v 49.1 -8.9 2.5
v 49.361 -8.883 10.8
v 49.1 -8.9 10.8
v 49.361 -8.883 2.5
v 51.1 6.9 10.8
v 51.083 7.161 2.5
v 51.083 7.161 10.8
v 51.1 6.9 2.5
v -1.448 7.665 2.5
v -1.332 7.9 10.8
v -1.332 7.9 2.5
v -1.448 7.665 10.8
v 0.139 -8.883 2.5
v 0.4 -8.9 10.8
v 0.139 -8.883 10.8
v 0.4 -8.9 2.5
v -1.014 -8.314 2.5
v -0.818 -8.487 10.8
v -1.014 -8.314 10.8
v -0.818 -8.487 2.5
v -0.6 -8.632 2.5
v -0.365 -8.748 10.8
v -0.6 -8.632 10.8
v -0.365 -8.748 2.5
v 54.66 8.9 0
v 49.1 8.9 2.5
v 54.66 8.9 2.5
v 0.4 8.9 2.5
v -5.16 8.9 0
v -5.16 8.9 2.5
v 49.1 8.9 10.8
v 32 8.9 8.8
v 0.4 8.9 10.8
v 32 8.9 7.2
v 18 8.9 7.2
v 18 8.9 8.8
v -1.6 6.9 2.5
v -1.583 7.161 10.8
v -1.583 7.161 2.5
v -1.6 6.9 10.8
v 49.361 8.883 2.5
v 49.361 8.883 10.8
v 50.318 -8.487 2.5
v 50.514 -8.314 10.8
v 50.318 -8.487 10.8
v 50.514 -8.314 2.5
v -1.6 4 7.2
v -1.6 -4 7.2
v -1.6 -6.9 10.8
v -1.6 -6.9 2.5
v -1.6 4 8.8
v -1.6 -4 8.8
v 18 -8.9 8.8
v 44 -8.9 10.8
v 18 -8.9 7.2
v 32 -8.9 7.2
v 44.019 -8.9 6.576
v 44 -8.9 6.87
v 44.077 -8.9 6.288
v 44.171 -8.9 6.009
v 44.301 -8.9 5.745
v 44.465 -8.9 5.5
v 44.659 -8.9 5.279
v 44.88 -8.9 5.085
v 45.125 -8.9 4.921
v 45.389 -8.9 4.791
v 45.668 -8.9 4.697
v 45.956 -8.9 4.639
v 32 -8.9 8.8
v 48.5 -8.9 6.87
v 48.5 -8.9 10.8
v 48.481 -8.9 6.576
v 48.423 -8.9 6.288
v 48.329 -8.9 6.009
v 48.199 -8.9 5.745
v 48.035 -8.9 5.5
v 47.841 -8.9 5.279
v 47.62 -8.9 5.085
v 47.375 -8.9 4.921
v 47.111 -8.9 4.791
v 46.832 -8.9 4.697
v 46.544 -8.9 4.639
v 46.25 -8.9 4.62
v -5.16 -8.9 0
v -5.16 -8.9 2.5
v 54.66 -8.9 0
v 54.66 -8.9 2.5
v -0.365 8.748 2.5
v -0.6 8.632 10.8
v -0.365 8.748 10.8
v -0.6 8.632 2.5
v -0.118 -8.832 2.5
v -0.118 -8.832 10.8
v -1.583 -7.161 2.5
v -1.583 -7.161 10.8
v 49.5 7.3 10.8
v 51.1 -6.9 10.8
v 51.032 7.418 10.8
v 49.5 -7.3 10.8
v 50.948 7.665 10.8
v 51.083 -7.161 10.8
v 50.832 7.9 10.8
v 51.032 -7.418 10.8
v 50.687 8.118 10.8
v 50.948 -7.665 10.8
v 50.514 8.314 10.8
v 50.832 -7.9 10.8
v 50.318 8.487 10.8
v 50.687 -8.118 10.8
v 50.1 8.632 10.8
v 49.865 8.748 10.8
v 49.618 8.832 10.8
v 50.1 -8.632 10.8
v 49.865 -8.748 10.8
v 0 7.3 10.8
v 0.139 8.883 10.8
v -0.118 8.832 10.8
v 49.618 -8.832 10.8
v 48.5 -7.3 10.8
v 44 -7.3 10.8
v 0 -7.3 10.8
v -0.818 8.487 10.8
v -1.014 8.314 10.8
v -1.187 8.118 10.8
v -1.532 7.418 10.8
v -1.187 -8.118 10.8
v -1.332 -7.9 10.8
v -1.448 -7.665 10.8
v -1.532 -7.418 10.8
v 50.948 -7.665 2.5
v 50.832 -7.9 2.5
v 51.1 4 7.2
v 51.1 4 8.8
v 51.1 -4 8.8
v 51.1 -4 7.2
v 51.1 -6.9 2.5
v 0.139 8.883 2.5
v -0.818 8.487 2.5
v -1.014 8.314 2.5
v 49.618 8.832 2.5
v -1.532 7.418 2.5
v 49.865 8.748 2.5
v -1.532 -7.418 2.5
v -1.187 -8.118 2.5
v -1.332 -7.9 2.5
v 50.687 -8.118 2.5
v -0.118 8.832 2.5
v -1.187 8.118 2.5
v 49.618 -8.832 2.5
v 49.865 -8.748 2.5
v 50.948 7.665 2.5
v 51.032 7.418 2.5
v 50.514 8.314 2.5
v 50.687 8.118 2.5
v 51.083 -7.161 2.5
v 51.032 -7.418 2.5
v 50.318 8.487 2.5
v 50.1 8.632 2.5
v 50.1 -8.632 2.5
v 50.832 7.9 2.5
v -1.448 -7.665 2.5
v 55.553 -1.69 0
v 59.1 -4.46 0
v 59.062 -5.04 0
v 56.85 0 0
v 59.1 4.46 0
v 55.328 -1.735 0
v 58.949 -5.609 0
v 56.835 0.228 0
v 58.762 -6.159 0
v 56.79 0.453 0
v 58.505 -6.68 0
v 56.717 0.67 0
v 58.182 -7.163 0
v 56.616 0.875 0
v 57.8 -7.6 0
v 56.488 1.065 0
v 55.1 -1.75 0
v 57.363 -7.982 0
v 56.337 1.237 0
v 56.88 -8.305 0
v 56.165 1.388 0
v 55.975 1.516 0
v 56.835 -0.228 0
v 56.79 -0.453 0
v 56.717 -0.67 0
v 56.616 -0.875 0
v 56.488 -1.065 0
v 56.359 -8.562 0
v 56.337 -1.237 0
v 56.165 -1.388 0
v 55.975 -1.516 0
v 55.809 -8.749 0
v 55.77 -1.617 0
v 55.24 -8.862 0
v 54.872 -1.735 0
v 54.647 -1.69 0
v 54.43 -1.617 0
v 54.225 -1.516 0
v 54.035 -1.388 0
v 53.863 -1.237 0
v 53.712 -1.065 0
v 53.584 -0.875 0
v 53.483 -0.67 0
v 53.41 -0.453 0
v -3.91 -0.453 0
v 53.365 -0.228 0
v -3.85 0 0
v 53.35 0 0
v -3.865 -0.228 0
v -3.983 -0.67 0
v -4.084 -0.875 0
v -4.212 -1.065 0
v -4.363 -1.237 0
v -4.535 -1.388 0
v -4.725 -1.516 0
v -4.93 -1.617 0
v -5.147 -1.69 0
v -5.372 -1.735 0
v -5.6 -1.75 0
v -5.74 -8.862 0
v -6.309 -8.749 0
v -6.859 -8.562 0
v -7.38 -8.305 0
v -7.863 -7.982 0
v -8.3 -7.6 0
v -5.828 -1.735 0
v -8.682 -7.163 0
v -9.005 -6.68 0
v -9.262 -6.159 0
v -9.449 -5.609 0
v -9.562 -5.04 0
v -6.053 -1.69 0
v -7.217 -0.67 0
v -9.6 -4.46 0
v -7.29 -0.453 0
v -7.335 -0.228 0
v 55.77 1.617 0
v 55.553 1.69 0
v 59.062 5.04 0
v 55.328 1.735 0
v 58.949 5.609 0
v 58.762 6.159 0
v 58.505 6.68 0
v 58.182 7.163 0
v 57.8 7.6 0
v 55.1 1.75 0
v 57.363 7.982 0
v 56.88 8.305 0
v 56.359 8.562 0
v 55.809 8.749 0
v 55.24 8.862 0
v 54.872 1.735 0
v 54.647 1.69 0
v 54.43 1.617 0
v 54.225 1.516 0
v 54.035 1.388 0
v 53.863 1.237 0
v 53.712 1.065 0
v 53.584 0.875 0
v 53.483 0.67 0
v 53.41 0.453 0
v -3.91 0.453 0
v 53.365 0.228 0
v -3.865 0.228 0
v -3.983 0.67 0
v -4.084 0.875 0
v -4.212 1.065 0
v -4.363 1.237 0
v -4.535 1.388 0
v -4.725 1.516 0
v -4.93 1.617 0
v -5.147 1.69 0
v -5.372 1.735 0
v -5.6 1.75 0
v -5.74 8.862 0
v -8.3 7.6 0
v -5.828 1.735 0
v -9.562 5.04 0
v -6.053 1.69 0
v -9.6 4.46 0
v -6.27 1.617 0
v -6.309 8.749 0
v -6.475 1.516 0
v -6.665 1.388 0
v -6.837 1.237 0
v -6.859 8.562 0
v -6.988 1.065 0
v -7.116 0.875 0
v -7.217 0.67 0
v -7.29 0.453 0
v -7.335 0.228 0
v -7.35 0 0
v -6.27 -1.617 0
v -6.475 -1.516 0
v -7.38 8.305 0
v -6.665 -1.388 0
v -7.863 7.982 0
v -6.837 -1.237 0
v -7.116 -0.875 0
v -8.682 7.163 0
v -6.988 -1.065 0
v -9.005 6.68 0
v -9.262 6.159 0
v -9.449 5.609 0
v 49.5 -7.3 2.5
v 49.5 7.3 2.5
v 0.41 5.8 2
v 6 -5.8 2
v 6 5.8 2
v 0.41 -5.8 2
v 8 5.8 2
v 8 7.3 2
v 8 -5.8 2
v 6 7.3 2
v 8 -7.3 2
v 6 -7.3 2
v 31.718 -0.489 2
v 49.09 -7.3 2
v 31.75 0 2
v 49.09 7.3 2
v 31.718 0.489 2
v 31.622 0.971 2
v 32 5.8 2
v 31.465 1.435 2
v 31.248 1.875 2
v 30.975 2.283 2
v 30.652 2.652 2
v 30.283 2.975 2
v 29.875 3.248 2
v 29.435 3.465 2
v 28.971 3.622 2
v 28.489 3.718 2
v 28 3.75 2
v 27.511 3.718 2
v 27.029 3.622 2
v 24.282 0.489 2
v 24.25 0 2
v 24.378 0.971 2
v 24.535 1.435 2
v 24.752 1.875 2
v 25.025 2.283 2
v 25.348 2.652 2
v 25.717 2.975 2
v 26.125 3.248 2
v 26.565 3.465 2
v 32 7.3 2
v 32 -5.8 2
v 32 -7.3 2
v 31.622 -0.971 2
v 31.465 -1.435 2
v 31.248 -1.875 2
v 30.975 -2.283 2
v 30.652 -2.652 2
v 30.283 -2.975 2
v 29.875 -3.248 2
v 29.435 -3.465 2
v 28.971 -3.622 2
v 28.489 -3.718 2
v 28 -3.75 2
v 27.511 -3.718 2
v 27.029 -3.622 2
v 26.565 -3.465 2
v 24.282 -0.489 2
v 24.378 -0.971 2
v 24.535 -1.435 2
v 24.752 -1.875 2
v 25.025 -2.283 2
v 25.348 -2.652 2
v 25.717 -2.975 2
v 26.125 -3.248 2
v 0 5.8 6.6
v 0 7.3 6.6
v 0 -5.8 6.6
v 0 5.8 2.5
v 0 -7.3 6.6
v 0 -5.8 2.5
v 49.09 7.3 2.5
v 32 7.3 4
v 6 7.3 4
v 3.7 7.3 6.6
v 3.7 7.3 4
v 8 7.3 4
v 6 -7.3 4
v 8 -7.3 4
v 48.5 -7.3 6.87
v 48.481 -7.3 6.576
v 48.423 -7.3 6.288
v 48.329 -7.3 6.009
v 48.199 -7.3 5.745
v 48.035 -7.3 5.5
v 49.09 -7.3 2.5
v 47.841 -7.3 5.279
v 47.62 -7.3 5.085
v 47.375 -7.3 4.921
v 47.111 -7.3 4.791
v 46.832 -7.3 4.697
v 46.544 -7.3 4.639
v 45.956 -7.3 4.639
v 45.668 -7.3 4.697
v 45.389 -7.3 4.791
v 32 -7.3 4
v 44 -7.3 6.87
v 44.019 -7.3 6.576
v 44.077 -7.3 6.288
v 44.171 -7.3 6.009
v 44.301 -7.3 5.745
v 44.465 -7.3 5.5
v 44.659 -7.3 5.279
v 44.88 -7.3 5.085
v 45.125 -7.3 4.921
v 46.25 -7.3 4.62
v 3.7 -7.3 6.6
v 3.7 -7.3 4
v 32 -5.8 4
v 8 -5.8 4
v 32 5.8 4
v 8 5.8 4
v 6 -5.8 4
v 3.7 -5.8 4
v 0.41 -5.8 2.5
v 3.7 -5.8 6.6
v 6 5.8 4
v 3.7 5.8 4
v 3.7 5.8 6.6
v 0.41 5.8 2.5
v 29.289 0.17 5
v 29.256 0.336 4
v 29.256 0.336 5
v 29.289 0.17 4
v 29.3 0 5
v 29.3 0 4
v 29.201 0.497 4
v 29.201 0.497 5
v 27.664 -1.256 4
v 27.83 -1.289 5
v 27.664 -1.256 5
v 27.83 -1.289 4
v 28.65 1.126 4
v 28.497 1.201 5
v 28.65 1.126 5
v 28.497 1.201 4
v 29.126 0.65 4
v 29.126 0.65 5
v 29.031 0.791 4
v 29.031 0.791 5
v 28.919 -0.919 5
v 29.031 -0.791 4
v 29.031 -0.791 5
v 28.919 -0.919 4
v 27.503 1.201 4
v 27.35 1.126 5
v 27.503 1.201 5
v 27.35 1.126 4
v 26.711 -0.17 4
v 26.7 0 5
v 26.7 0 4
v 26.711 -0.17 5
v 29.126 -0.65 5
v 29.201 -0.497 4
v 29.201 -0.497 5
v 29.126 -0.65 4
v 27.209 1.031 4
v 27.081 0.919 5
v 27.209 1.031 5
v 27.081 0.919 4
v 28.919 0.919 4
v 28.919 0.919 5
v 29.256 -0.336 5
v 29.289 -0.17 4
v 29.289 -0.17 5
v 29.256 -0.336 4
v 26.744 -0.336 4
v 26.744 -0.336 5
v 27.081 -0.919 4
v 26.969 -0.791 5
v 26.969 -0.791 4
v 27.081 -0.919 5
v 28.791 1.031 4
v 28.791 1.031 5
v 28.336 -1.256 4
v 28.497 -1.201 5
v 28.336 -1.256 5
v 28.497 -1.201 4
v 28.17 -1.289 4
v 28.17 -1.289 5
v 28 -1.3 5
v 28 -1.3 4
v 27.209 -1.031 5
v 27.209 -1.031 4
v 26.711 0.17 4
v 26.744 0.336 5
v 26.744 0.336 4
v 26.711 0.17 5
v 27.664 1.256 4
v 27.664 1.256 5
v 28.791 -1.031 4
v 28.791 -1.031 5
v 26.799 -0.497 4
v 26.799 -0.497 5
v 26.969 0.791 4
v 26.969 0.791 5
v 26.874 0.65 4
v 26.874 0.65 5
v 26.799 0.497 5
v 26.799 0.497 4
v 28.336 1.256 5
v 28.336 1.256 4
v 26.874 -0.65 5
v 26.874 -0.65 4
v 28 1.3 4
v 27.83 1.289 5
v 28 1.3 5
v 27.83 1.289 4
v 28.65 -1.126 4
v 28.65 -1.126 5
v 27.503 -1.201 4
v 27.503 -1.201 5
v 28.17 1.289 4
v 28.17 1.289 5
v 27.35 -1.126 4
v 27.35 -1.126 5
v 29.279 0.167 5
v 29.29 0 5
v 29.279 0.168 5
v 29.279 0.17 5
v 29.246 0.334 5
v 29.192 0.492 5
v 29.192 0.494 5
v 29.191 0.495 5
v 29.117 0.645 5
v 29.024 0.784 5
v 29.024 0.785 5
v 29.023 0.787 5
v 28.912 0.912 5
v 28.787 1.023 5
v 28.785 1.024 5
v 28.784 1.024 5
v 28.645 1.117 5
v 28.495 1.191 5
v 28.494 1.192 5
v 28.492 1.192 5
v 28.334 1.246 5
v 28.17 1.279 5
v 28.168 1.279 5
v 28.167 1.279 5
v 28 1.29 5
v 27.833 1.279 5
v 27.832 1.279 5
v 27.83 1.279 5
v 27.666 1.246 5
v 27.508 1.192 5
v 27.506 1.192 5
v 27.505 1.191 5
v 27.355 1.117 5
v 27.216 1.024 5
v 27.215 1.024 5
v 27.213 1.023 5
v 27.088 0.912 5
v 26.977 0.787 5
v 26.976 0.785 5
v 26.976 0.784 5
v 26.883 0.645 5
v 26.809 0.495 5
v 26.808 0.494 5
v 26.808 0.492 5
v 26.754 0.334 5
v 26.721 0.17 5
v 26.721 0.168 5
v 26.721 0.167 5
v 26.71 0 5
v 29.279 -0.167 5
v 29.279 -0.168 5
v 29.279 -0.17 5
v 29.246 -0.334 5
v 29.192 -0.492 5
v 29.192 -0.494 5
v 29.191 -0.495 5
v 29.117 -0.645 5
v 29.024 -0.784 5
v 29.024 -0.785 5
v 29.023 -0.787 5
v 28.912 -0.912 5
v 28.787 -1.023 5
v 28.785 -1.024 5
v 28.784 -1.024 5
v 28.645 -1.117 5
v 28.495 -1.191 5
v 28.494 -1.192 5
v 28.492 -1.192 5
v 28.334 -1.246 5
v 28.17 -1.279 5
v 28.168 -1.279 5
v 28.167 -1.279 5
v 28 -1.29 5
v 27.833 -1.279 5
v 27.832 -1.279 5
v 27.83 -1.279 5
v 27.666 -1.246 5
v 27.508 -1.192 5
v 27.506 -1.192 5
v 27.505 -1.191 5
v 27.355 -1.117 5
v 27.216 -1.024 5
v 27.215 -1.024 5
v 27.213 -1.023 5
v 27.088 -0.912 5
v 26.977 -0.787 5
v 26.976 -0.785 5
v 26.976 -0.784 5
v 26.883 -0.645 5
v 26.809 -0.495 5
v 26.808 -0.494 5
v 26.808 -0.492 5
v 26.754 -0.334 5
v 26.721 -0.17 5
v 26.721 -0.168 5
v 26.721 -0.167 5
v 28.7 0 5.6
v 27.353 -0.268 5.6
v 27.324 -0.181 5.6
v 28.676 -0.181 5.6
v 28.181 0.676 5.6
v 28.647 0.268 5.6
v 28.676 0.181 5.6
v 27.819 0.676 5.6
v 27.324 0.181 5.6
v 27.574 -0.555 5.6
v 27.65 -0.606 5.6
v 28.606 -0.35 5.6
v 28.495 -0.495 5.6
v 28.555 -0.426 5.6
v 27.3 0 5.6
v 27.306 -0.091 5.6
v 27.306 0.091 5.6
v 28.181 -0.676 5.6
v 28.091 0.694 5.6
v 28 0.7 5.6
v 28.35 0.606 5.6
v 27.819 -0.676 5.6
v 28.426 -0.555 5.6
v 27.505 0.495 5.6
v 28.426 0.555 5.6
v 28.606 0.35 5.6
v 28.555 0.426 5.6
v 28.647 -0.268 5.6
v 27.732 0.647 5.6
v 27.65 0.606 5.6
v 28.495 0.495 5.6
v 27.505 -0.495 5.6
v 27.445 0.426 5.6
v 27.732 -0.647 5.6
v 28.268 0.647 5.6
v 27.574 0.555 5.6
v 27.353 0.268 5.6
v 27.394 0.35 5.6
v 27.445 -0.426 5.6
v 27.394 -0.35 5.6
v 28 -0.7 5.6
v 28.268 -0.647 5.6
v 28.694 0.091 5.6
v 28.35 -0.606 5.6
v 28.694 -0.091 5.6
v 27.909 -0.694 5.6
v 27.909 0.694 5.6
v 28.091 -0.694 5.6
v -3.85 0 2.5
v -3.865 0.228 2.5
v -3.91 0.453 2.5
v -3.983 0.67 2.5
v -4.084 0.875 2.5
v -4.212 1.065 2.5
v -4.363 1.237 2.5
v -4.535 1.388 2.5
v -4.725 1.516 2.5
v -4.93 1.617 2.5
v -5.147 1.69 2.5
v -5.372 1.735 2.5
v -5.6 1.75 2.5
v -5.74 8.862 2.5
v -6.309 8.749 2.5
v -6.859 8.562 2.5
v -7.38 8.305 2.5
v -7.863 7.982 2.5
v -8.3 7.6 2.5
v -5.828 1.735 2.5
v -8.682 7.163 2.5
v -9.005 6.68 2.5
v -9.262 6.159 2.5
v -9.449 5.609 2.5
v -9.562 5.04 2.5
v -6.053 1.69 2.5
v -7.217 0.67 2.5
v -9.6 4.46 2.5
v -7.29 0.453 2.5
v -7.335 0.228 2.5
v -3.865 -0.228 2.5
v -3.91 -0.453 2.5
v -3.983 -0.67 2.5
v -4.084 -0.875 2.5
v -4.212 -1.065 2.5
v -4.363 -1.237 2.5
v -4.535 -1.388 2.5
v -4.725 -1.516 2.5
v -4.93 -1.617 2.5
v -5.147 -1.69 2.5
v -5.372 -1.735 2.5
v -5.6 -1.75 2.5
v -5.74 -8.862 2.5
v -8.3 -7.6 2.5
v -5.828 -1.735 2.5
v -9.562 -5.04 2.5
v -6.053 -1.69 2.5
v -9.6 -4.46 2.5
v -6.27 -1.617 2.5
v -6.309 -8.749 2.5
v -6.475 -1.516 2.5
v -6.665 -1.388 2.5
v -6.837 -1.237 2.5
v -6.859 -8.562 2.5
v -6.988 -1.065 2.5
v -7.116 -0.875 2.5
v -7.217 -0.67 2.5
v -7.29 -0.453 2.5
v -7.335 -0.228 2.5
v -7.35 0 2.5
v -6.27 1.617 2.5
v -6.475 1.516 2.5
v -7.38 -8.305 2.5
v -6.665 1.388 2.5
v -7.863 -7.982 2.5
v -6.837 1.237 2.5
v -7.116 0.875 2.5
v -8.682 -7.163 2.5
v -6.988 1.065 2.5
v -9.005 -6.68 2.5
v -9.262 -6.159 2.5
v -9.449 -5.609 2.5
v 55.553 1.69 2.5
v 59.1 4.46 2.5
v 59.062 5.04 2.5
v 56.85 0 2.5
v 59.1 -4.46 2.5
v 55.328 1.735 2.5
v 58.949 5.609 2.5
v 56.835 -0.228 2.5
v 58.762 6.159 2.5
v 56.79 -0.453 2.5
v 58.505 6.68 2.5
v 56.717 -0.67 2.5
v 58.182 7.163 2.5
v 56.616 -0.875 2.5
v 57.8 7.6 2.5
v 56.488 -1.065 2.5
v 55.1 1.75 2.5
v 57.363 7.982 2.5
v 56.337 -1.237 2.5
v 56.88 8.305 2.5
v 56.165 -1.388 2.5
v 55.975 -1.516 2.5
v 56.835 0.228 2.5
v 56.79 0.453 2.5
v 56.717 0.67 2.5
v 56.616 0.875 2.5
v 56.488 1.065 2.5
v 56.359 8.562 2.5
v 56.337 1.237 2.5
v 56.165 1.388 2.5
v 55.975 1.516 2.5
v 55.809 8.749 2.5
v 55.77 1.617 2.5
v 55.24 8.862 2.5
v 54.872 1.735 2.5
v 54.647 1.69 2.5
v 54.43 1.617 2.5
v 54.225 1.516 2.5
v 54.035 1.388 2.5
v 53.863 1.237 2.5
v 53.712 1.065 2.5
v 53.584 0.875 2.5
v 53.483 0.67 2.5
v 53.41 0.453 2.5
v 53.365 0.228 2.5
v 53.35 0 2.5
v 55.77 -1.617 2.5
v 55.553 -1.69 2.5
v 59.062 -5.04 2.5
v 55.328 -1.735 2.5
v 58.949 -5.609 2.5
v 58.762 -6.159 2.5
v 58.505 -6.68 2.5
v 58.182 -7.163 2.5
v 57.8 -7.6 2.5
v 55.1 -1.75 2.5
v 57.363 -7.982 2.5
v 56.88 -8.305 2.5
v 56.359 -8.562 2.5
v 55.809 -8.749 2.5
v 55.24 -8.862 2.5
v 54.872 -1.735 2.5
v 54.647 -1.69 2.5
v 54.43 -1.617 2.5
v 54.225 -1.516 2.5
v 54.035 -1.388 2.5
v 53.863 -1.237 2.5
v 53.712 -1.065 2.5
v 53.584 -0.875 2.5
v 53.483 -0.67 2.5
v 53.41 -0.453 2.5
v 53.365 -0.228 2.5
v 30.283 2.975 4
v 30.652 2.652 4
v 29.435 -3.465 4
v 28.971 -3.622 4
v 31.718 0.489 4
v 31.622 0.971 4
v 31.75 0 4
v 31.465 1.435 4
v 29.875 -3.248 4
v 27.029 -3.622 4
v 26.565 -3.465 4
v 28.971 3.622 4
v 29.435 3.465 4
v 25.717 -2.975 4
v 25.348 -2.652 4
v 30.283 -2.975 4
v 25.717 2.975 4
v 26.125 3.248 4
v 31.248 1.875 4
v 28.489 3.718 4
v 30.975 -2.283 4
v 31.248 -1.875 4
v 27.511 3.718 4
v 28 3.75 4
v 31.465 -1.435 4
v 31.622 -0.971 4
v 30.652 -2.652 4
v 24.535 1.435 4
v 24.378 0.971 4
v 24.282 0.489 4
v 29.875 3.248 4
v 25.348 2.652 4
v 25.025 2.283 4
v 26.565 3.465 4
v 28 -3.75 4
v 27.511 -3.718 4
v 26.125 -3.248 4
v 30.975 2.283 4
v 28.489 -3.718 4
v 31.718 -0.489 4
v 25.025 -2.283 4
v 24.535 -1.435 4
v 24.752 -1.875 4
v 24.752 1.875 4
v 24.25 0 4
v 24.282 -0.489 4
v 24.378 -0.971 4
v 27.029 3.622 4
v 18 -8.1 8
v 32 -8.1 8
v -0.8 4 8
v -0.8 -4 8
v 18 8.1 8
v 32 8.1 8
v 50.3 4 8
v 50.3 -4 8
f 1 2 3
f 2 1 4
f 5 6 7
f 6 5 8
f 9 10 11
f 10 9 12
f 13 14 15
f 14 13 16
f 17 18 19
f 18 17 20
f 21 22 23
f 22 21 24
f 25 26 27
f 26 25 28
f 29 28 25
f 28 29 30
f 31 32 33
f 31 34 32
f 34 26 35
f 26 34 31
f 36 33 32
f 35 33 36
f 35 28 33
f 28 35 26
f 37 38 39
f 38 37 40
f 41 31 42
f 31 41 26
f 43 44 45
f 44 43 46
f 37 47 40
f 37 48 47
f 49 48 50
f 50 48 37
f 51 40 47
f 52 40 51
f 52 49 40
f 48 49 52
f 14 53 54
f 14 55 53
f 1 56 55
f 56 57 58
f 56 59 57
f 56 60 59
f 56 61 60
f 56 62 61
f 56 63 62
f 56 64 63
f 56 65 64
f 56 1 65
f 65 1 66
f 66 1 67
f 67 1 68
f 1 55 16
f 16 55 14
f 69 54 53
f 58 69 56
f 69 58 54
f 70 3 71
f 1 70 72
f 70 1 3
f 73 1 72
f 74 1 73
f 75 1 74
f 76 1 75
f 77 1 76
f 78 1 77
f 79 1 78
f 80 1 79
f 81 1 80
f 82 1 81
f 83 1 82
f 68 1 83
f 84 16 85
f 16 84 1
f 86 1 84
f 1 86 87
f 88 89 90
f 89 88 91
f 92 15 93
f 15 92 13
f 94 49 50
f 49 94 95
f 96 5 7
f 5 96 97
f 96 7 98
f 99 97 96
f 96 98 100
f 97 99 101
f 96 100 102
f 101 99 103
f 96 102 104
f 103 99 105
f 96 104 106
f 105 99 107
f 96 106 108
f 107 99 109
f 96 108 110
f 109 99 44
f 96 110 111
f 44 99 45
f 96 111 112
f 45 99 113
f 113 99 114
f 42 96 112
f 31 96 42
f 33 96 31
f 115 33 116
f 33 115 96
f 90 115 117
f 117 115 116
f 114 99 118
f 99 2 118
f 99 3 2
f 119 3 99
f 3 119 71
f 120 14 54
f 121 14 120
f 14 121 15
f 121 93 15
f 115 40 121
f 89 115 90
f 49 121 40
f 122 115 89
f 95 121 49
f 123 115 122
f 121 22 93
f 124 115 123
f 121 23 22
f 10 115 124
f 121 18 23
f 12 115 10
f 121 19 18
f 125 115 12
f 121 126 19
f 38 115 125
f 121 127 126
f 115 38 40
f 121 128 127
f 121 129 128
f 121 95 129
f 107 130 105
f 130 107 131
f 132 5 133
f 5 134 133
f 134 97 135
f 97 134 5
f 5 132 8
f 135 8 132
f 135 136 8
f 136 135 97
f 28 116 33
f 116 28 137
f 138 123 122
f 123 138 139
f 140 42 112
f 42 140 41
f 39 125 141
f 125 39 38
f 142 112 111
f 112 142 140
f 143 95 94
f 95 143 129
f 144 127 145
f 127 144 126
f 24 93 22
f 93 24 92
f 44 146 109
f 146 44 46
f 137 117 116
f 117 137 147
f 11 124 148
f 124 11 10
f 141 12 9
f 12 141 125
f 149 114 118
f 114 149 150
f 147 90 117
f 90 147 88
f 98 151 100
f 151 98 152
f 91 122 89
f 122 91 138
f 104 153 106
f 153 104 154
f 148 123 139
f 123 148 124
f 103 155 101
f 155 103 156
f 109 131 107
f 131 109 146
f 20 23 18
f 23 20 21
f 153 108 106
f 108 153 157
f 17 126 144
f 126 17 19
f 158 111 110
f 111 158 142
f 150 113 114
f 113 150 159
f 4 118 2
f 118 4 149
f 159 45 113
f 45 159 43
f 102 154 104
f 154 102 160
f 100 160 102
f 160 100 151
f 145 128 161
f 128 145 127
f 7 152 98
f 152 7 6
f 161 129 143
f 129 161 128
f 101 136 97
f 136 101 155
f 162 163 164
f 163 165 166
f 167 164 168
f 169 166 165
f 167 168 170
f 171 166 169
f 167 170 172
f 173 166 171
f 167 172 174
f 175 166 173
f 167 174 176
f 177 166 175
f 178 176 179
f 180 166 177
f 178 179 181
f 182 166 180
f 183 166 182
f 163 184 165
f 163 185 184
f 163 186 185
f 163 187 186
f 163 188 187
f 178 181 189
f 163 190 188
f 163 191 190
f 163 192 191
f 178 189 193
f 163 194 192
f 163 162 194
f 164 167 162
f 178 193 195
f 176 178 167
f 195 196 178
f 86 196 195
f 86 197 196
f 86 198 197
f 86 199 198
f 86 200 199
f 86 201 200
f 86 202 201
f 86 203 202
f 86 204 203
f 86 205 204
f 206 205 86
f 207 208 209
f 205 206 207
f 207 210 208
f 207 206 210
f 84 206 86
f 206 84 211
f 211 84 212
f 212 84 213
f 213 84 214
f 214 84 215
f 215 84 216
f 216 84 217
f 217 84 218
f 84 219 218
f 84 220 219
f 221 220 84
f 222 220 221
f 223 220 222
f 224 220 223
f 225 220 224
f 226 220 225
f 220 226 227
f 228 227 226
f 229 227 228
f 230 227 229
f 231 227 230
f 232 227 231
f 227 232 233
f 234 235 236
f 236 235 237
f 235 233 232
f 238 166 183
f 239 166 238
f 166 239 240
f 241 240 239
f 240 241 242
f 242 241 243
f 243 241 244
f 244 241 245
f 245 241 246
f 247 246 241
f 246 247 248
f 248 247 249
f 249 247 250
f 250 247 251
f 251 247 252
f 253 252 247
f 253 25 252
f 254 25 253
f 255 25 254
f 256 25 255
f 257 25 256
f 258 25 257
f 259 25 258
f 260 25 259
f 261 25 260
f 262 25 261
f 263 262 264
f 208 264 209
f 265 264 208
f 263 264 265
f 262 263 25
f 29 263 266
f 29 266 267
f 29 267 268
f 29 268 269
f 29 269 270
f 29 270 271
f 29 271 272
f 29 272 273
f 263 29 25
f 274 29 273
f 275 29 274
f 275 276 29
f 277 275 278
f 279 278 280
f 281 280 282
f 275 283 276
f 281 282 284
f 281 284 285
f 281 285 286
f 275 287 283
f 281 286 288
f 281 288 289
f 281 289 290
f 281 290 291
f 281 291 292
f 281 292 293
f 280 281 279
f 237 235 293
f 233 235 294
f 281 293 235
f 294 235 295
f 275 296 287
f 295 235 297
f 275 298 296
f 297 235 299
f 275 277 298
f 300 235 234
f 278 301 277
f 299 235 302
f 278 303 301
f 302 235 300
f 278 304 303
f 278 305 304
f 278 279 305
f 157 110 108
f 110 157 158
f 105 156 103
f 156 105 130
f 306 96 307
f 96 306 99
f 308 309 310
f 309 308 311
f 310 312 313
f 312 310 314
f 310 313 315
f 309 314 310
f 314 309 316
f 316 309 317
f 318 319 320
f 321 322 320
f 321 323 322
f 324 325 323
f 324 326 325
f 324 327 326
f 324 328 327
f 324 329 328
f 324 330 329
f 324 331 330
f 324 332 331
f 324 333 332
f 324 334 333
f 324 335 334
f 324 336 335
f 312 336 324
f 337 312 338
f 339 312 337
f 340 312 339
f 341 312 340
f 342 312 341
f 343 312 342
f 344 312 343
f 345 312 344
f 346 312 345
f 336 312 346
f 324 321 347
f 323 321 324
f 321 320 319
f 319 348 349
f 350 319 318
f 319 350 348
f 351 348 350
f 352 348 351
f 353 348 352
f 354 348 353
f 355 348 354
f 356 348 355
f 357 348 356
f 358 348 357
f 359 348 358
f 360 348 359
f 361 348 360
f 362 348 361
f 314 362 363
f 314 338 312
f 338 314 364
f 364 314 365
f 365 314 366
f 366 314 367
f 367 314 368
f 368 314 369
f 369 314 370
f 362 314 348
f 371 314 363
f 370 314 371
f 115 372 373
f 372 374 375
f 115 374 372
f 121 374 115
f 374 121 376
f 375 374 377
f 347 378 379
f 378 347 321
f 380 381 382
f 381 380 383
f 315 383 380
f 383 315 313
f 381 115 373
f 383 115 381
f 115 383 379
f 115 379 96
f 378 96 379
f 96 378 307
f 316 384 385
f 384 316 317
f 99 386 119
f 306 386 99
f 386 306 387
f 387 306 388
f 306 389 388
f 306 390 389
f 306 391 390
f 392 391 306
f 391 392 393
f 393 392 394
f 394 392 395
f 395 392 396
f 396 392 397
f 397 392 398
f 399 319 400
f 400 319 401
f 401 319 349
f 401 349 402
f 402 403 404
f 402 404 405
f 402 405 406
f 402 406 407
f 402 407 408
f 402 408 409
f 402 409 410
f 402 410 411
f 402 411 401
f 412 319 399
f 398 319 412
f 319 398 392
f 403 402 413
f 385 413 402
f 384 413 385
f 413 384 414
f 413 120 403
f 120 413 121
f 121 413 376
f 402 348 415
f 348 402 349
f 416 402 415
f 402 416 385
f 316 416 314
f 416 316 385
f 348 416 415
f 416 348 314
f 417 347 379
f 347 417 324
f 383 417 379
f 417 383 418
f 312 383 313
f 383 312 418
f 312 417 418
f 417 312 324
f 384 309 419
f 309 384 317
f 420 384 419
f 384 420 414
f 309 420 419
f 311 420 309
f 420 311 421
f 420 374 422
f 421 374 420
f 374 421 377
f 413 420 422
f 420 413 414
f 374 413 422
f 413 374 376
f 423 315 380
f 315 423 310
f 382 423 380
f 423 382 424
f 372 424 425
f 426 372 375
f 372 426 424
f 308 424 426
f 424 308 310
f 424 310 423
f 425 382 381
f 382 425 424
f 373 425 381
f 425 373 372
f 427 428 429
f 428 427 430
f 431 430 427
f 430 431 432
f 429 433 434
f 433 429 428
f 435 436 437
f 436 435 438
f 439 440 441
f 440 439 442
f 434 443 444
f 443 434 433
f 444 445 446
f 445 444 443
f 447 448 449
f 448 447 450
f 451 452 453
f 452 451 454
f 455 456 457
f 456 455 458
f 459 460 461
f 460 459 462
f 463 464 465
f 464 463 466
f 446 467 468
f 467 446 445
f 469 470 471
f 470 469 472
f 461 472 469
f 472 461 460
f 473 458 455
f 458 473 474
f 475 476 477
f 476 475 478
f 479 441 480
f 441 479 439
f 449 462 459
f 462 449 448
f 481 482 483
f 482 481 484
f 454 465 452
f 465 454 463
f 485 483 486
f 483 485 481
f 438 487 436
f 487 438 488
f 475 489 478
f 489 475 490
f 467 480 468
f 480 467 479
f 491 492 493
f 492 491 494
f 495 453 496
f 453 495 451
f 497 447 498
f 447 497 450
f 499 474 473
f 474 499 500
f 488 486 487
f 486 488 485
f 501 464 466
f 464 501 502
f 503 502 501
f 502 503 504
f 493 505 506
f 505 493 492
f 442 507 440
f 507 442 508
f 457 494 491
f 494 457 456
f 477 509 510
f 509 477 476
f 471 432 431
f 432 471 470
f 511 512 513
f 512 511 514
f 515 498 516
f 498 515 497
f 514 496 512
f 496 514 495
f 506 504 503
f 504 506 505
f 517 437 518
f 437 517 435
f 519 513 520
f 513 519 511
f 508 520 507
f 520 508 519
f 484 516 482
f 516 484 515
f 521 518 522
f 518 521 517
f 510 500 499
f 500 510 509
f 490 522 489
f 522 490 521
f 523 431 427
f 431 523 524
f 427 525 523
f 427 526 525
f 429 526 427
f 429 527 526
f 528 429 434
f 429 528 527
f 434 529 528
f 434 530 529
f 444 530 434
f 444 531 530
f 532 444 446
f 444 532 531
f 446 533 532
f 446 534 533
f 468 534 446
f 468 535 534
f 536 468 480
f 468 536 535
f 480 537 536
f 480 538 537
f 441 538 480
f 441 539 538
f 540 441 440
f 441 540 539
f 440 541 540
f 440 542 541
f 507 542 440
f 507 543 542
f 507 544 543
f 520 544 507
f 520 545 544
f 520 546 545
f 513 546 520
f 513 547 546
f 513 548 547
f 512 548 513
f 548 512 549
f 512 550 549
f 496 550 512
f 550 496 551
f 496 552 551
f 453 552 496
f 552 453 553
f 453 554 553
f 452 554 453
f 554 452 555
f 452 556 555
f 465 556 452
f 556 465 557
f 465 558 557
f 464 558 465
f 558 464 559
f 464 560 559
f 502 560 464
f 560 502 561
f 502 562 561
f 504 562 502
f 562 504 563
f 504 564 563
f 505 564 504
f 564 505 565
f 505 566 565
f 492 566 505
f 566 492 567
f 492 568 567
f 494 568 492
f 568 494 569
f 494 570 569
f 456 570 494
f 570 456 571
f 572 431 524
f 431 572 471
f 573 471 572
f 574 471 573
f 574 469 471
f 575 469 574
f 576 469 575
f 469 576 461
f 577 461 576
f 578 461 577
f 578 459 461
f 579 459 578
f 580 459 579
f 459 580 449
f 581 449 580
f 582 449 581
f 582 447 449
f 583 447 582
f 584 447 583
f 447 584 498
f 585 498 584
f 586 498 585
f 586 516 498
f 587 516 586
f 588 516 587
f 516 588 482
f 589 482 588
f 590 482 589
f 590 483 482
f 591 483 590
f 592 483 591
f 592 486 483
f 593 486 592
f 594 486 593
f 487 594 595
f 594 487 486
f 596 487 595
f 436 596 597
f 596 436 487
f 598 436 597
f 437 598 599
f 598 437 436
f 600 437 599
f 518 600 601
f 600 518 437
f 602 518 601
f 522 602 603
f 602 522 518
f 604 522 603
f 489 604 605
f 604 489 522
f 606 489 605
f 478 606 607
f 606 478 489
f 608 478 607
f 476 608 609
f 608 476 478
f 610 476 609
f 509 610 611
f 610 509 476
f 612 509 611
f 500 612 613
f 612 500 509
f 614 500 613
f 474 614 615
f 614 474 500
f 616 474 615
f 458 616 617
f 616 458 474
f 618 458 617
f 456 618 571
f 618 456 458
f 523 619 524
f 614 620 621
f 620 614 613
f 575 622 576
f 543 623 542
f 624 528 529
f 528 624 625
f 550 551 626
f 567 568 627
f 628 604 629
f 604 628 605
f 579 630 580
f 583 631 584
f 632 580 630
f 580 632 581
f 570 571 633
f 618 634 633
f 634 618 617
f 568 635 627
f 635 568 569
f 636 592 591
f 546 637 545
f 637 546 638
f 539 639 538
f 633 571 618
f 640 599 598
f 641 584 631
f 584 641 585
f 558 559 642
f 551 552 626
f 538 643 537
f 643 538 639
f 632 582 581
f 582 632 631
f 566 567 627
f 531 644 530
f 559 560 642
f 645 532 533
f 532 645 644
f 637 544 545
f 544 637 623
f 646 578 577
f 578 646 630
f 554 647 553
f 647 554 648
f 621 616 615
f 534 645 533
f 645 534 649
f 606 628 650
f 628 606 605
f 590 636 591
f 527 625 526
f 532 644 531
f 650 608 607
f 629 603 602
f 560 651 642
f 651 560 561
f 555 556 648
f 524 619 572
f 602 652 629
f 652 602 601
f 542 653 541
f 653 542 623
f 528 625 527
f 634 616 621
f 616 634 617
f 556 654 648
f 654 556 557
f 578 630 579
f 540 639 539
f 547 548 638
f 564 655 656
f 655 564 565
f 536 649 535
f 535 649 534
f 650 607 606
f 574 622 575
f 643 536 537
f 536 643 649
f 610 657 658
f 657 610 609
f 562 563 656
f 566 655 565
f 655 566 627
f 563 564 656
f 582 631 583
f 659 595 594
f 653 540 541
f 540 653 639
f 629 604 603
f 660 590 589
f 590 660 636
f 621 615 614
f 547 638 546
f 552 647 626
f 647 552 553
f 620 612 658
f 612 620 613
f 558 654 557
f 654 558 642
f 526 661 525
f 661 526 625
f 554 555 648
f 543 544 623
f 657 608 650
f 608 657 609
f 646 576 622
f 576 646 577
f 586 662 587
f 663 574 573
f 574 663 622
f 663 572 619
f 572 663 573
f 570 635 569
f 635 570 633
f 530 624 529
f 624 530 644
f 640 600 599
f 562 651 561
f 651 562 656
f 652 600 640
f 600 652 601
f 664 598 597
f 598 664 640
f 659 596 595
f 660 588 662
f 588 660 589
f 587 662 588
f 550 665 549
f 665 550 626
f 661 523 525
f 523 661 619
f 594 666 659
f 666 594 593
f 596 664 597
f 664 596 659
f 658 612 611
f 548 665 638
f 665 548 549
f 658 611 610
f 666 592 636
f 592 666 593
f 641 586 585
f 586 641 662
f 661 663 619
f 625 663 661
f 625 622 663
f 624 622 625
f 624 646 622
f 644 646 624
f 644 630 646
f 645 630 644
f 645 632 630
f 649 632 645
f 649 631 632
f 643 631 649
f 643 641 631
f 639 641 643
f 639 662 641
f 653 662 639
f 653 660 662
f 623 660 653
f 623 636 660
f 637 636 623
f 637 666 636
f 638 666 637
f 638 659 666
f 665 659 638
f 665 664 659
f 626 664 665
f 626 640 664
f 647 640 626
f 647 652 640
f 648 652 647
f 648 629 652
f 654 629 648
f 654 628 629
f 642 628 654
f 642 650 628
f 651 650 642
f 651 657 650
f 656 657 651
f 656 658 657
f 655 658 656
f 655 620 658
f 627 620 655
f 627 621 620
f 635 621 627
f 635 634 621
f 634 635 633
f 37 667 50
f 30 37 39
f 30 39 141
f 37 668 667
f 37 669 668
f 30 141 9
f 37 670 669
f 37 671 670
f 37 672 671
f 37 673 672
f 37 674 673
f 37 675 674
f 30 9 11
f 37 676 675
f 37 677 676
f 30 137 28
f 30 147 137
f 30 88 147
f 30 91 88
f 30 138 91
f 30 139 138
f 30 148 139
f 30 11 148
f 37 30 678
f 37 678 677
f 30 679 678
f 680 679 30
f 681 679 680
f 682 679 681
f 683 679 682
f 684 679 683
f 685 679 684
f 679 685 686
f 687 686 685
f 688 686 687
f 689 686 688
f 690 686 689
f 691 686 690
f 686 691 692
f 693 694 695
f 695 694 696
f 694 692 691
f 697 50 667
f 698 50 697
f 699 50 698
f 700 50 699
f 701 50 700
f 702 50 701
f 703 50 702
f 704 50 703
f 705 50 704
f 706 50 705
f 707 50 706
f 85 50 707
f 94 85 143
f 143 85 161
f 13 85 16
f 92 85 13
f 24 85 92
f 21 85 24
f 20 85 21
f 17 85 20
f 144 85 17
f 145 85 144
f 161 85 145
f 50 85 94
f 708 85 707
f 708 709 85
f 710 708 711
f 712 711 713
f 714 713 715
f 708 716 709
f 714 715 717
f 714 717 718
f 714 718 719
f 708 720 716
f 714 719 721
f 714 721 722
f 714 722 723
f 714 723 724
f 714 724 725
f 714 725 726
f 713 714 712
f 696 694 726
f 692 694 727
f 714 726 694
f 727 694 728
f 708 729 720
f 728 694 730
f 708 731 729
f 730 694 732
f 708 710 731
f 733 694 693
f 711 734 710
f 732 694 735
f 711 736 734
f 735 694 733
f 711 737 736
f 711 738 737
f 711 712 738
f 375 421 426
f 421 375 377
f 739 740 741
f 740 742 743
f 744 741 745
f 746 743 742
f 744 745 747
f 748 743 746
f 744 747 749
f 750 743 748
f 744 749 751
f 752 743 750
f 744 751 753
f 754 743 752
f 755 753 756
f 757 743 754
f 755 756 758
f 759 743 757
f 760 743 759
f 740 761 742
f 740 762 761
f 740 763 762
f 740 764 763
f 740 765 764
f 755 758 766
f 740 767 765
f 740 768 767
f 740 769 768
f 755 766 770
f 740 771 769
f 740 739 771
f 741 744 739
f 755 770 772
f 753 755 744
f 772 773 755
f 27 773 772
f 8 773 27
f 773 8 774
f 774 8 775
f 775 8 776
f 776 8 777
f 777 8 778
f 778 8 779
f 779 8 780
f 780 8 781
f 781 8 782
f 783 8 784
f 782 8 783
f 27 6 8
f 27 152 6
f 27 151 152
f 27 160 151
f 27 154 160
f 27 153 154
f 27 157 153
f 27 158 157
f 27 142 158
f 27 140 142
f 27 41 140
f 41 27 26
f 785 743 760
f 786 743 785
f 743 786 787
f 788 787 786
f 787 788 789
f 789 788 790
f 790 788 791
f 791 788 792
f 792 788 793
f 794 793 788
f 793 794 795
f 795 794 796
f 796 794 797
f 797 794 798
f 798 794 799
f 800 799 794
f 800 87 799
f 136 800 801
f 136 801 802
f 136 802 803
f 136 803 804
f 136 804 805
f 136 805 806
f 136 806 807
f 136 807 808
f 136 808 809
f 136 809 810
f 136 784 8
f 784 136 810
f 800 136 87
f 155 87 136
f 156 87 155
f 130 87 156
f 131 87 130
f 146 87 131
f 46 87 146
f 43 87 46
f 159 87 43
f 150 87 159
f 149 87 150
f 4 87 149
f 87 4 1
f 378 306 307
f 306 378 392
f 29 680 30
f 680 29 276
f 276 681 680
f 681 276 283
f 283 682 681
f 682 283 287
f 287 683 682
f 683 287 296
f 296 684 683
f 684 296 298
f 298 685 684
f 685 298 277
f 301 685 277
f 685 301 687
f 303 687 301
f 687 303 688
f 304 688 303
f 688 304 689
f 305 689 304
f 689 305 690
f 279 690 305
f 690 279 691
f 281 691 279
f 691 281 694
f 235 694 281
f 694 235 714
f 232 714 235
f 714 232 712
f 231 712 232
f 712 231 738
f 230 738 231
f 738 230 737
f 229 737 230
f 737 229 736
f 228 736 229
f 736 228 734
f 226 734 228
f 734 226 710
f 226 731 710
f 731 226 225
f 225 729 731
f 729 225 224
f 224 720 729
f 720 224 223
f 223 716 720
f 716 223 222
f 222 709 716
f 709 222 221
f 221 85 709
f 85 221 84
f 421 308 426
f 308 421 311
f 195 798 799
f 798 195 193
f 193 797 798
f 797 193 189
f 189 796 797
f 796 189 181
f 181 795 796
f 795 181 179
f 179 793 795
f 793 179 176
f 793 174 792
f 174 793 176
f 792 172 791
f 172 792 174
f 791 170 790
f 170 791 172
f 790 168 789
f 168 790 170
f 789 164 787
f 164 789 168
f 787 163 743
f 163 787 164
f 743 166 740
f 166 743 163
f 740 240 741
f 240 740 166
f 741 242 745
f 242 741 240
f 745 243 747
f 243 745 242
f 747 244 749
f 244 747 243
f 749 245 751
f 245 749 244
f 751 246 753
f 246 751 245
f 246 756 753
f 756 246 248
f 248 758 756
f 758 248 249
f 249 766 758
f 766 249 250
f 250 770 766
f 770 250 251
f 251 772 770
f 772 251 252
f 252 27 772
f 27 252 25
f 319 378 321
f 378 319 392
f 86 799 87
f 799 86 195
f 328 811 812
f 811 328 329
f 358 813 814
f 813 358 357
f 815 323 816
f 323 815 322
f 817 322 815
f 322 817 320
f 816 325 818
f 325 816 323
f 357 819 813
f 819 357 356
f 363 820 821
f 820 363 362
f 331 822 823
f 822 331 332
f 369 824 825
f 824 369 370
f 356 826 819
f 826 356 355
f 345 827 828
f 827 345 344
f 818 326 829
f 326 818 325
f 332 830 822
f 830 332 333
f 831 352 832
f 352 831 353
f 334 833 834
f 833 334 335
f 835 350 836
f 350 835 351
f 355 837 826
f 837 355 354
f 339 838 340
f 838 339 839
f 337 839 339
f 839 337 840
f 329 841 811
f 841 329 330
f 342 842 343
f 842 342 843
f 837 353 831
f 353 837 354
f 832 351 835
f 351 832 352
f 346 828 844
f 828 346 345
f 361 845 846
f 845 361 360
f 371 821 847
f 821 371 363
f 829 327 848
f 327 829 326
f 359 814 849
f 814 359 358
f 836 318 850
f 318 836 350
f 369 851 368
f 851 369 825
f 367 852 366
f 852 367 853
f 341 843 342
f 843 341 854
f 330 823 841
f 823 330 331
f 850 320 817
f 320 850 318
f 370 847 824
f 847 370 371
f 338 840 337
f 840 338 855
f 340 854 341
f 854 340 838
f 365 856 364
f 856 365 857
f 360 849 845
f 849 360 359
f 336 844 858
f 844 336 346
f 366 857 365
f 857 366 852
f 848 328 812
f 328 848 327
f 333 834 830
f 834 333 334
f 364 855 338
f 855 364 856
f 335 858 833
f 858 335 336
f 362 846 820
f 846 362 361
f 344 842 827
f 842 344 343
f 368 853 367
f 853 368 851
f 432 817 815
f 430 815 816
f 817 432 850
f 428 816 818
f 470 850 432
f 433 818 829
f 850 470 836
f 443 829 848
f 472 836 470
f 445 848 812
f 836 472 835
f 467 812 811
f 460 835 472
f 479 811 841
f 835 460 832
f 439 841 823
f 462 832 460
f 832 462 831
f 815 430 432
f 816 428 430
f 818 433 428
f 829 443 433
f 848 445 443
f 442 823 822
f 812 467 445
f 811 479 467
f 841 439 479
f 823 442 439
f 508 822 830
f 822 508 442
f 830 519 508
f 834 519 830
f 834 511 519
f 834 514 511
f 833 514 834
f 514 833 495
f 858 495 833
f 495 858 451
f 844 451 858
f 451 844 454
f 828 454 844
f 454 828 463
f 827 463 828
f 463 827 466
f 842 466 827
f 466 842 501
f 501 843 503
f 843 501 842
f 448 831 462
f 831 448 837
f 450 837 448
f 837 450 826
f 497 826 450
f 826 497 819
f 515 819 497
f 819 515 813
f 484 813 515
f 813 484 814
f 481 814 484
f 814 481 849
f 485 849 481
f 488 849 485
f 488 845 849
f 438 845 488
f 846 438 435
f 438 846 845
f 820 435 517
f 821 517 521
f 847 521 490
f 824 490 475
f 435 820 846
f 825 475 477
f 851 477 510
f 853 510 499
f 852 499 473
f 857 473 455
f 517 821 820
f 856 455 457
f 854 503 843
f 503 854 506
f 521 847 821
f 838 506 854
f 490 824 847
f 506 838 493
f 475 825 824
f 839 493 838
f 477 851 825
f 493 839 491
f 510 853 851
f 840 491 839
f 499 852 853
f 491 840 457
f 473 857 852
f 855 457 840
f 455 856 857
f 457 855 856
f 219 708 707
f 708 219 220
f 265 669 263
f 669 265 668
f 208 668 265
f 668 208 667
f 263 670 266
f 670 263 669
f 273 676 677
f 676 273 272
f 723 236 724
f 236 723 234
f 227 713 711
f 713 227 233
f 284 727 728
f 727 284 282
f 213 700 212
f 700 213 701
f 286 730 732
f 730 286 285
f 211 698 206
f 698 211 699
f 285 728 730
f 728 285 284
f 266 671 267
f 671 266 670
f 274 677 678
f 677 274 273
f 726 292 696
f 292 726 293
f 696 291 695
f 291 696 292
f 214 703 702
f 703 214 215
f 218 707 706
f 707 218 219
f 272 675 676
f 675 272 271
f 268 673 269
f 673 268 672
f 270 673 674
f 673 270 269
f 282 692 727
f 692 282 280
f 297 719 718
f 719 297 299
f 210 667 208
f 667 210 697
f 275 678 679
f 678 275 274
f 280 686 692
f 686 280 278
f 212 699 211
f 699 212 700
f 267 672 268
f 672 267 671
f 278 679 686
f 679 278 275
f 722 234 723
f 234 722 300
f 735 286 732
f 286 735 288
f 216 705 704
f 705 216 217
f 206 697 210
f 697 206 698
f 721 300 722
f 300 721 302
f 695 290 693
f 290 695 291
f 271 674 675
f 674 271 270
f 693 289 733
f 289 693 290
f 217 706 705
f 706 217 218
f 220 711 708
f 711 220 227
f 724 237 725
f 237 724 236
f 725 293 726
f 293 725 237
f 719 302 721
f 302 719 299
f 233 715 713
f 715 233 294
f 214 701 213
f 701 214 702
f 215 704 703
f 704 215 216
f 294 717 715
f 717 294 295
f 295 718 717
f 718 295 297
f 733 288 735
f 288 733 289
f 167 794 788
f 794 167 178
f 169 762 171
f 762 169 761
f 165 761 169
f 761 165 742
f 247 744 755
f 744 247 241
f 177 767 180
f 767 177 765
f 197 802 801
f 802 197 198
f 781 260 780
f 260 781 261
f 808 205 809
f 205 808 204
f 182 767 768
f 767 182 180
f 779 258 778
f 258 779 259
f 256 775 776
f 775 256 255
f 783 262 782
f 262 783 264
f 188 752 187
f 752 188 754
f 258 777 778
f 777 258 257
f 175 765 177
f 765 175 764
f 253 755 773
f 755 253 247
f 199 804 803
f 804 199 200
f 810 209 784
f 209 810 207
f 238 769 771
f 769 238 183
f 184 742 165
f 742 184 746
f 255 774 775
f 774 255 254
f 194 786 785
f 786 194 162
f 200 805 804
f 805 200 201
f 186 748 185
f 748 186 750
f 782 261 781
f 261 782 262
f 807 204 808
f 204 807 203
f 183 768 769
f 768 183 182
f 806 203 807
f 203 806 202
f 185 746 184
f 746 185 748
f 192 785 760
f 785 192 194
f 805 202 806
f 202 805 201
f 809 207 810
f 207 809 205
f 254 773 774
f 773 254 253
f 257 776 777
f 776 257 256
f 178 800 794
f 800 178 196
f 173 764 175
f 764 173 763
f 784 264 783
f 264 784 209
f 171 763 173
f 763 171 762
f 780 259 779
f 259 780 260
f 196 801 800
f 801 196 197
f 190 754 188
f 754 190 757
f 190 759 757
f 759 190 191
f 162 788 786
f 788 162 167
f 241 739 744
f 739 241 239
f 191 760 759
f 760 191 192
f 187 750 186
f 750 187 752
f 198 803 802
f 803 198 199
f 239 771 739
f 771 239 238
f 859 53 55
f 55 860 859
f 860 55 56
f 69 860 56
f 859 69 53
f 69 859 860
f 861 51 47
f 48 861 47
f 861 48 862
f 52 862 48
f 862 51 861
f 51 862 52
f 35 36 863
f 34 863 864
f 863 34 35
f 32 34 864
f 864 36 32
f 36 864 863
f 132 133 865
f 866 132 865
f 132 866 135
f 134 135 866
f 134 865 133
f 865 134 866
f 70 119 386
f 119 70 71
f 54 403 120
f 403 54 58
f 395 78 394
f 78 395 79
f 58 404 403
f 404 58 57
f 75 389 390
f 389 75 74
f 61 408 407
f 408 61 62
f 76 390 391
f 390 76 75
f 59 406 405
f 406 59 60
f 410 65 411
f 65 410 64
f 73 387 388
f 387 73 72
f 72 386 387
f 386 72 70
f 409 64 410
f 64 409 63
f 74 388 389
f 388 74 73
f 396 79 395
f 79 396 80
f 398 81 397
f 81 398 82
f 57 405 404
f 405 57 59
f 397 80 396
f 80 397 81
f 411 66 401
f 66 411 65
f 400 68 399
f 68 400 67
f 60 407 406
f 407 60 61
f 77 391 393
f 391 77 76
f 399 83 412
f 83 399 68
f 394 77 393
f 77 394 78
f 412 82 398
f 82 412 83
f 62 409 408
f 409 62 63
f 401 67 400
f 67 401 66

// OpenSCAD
// Photocell flame pod: a small PETG shell for one LM393 photoresistor module.
// Origin: inside floor corner at the photocell end, centred across. X along the module, header end at +X.
// Print floor down, as modelled. The module sits component side up on two edge ledges and a boss.
// Potted (default): a pin on the boss locates the board; epoxy fills to just under the trimpot top, so
// board, header, leads and cable entry are sealed, the trimpot stays adjustable and the cell stands proud on its leads.
// The rim stands just over the trimpot; a snap cover (part-cover.scad) closes over it, the cell up through a hole.
// Lidded: one M3 down through the board into a nut pressed into the boss; a clear acrylic lid
// (part-lid.scad) on four corner columns, the photocell just under it.
// The cable leaves through the -Y side wall near the header-end corner, clear of the end tabs,
// the cable is held by the epoxy in the exit.

/* [Module: LM393 photoresistor, on hand (owner, caliper)] */
board_l = 31;
board_w = 14;
board_t = 1.6;        // guessed, standard PCB
hole_from_hdr = 7;    // hole centre from the header end, centred across: ~4 hole, rim 5 from the end
pot_h = 4.9;          // trimpot top above the board top (owner, caliper, 2026-11-24)
cell_h = 11.5;        // photocell top above the board top, bent up on its leads (owner)
cell_d = 5;           // guessed: common 5 mm CdS cell
cell_t = 2.5;         // guessed: cell body thickness; potting stops at its underside
fit = 0.3;            // per side, board edge to inner wall; guessed, PETG fit uncalibrated

/* [Build] */
potted = true;
lead = "solder";      // [solder, dupont]
plug_out = 15;        // dupont: board edge to the plug's back end; guessed, 14 housing + header spacer
solder_out = 9;       // solder: board edge to the end of the heatshrink over the pins; guessed
cable_d = 4.5;        // exit width for a 3-core cable; guessed, caliper the cable
pin_z = 1.27;         // header pin row above the board top; right-angle header, guessed
end_clear = 1;        // cable exit's far edge to the inner end wall

/* [Shell] */
wall = 1.6;           // 4 lines at 0.4
floor_t = 2;
corner_r = 2;         // outside vertical corners
ledge = 2;            // board underside above the floor: clears solder stubs
ledge_lip = 1.2;      // ledge reach in under the board edge: solder pads sit 1.4 in (halmet-enclosure-mount)
cell_bare = 4;        // no side ledge under the photocell end this far in: its leads' solder
seat_l = 2;           // corner seats under the photocell end's two corners, this far in; the leads' solder is mid-board, clear (owner's ask, 2026-11-24)
stop_h = 1;           // end stop over the corner seats, above the board top: the board can't slide or tip toward the cell
hdr_bare = 3;         // nor under the header end's solder row
boss_d = 7.5;
locate_d = 2.6;       // potted: pin up through the board hole; 3.4 would not go in a printed PETG shell (owner, 2026-11-24)
locate_tip = 0.6;     // 45° chamfer on the pin top, a lead-in for the hole
cell_end = 4;         // board's photocell end to the inner end wall: the cell body overhangs here
pour_above = 4;       // potted: epoxy line above the board top: over the cable, under the trimpot top (owner, 2026-11-24)
pot_clear = 0.3;      // potted: rim above the trimpot top, so the cover closes over it (owner, 2026-11-24)

/* [Snap cover, potted only] */
cover_t = 1.6;        // plate on the rim
skirt_t = 1.2;        // skirt round the outside of the walls
skirt_h = 4;          // skirt below the rim; clears the end tabs
cover_gap = 0.2;      // per side, skirt to wall; the piezo lid at 0.2 fitted snug across (owner, 2026-11-24)
catch = 0.7;          // lip reach into the wall groove; the piezo lid at ~0.6 grazed and fell off (owner, 2026-11-24); the knob
catch_x = [18, 32];   // long-wall lips mid-wall, where the skirt bows most; clear of the cable exit
catch_y = 8;          // end-wall lips, centred across; the header end's is clear of the cable notch at the -Y corner
end_catch = 0.7;      // end-wall lip reach: the short skirt is stiff near its corners; the first cover says if it wants less
cell_x_on = 1;        // photocell centre in from the board's photocell end; guessed, from the photo
cell_hole_d = 8;      // generous: the cell is bent up by hand, its position is guessed
notch_clear = 0.5;    // per side, round the cable where it passes the skirt

/* [Lidded only] */
nut_af = 5.5;         // M3 hex nut across flats
nut_t = 2.4;
nut_fit = 0.15;       // per side; press fit, uncalibrated
screw_d = 3.4;        // M3 clearance, through the floor
top_clear = 1;        // photocell top to the lid's underside
column_d = 4.4;       // lid-screw columns near the four inside corners
col_in = 1.9;         // column centre in from the inner wall faces: the lid hole sits 3.5 from the lid edge
pilot_d = 2.2;        // M2.5 self-tapping; calibration pending
pilot_h = 8;
lid_t = 3;            // clear acrylic, laser cut
lid_hole_d = 2.9;     // M2.5 clearance

/* [Mounting tabs] */
tabs = true;
tab_l = 8;            // past each end wall
tab_t = 2.5;
tab_hole = 3.5;       // M3 or #6 pan head

part = "shell";        // [shell, cover, assembly, none]

/* [Hidden] */
$fn = 48;
lead_l = lead == "dupont" ? plug_out : solder_out;
bx0 = cell_end;                      // board's photocell end
bx1 = bx0 + board_l;                 // board's header end
exit_x = bx1 + lead_l + cable_d/2;   // cable exit centre, past the plug or heatshrink
in_l = exit_x + cable_d/2 + end_clear;
in_w = board_w + 2*fit;
out_l = in_l + 2*wall;
out_w = in_w + 2*wall;
hole_x = bx1 - hole_from_hdr;
board_z = floor_t + ledge;           // board underside
board_top = board_z + board_t;
pour_z = board_top + pour_above;           // potted: epoxy line
shell_h = potted ? board_top + pot_h + pot_clear : board_top + cell_h + top_clear;
cable_z = board_top + pin_z;               // cable centre, level with the header pins
cols = [for (x = [col_in, in_l - col_in], y = [-(in_w/2 - col_in), in_w/2 - col_in]) [x, y]];

module rrect(l, w, r) { offset(r = r) square([l - 2*r, w - 2*r], center = true); }
module outline() { translate([in_l/2, 0]) rrect(out_l, out_w, corner_r); }

module tab_2d() {
    for (s = [-1, 1]) hull() {
        translate([in_l/2 + s*(in_l/2 + wall - corner_r), 0]) square([0.02, out_w], center = true);
        translate([in_l/2 + s*(in_l/2 + wall + tab_l - out_w/4), 0]) rrect(out_w/2, out_w, out_w/4 - 0.01);
    }
}
function tab_holes() = [for (s = [-1, 1]) [in_l/2 + s*(in_l/2 + wall + tab_l/2), 0]];

module shell() {
    difference() {
        union() {
            difference() {
                linear_extrude(shell_h) outline();
                translate([0, -in_w/2, floor_t]) cube([in_l, in_w, shell_h]);
            }
            if (tabs) linear_extrude(tab_t) tab_2d();
            // edge ledges, one under each long edge of the board
            for (s = [-1, 1]) translate([bx0 + cell_bare, s > 0 ? in_w/2 - fit - ledge_lip : -in_w/2, floor_t - 0.01])
                cube([board_l - cell_bare - hdr_bare, ledge_lip + fit, ledge + 0.01]);
            // corner seats under the photocell end, each with an end stop rising from the end wall to past the board top
            for (s = [-1, 1]) translate([0, s > 0 ? in_w/2 - fit - ledge_lip : -in_w/2, floor_t - 0.01]) {
                cube([bx0 + seat_l, ledge_lip + fit, ledge + 0.01]);
                cube([bx0 - fit, ledge_lip + fit, ledge + board_t + stop_h + 0.01]);
            }
            translate([hole_x, 0, floor_t - 0.01]) cylinder(d = boss_d, h = ledge + 0.01);
            if (potted) translate([hole_x, 0, board_z - 0.01]) {
                cylinder(d = locate_d, h = board_t - locate_tip + 0.01);
                translate([0, 0, board_t - locate_tip]) cylinder(d1 = locate_d, d2 = locate_d - 2*locate_tip, h = locate_tip + 0.01);
            }
            else intersection() {   // lid-screw columns in the inside corners
                for (c = cols) translate([c[0], c[1], 0]) cylinder(d = column_d, h = shell_h);
                translate([0, -in_w/2, 0]) cube([in_l, in_w, shell_h]);
            }
        }
        if (!potted) {
            // M3 down through board and boss into a pressed-in nut; clearance on through the floor
            translate([hole_x, 0, -1]) cylinder(d = screw_d, h = board_z + 2);
            translate([hole_x, 0, board_z - nut_t]) cylinder(d = (nut_af + 2*nut_fit) / cos(30), h = nut_t + 1, $fn = 6);
            for (c = cols) translate([c[0], c[1], shell_h - pilot_h]) cylinder(d = pilot_d, h = pilot_h + 1);
        }
        // cable exit in the -Y side wall, round-bottomed, open to the rim
        translate([exit_x - cable_d/2, -in_w/2 - wall - 1, cable_z]) cube([cable_d, wall + 2, shell_h]);
        translate([exit_x, -in_w/2 + 1, cable_z]) rotate([90, 0, 0]) cylinder(d = cable_d, h = wall + 2);
        if (tabs) for (h = tab_holes()) translate([h[0], h[1], -1]) cylinder(d = tab_hole, h = tab_t + 2);
        if (potted) for (s = [-1, 1], e = [false, true]) catch_profile(s, groove = true, end = e);
    }
}

// Snap catch: a 45° V lip on the cover skirt's inside, into a 45° V groove round the wall's outside,
// one mid-wall on each of the four walls. Both faces at 45°: the cover pops off to reach the trimpot,
// and neither needs support printed either way up.
lip_z = shell_h - skirt_h + 0.3 + cover_gap + catch;   // the V's apex height
module catch_profile(s, groove, end = false) {
    c = end ? end_catch : catch;
    w = end ? out_l/2 : out_w/2;       // wall's outside face, from the shell's centre
    y0 = groove ? w + 0.01 : w + cover_gap + 0.01;
    tip = groove ? w - c - 0.1 : w - c;
    h = abs(y0 - tip);
    pts = [[s*y0, lip_z - h], [s*tip, lip_z], [s*y0, lip_z + h]];
    if (end) translate([in_l/2, catch_y/2, 0]) rotate([90, 0, 0]) linear_extrude(catch_y) polygon(pts);
    else translate([catch_x[0], 0, 0]) rotate([90, 0, 90]) linear_extrude(catch_x[1] - catch_x[0]) polygon(pts);
}

cell_x = bx0 + cell_x_on;
module cover() {
    z0 = shell_h;
    difference() {
        union() {
            translate([0, 0, z0]) linear_extrude(cover_t) offset(r = cover_gap + skirt_t) outline();
            translate([0, 0, z0 - skirt_h]) linear_extrude(skirt_h + 0.01) difference() {
                offset(r = cover_gap + skirt_t) outline();
                offset(r = cover_gap) outline();
            }
            for (s = [-1, 1], e = [false, true]) catch_profile(s, groove = false, end = e);
        }
        translate([cell_x, 0, z0 - 1]) cylinder(d = cell_hole_d, h = cover_t + 2);
        // the cable passes the skirt in a notch open at the skirt's foot
        translate([exit_x - cable_d/2 - notch_clear, -out_w/2 - cover_gap - skirt_t - 1, z0 - skirt_h - 1])
            cube([cable_d + 2*notch_clear, cover_gap + skirt_t + 2, skirt_h + 1]);
    }
}

// Lidded build: the lid's cut profile, the shell's outline with two holes on a diagonal over the columns.
lid_cols = [cols[0], cols[3]];
module lid_2d() {
    difference() {
        outline();
        for (c = lid_cols) translate(c) circle(d = lid_hole_d);
    }
}

// Stand-ins for the review render only: board, trimpot, photocell, header, lead and cable.
module module_standin() {
    translate([bx0, -board_w/2, board_z]) difference() {
        cube([board_l, board_w, board_t]);
        translate([board_l - hole_from_hdr, board_w/2, -1]) cylinder(d = 4, h = board_t + 2);
    }
    translate([bx0 + 12, -3, board_top]) cube([7, 6, pot_h]);
    translate([bx0 + 1, 0, board_top + cell_h - cell_t]) cylinder(d = cell_d, h = cell_t);
    for (y = [-1.5, 1.5]) translate([bx0 + 1, y, board_top]) cylinder(d = 0.5, h = cell_h - cell_t, $fn = 8);
    translate([bx1 - 2.5, -3.8, board_top]) cube([2.5 + lead_l, 7.6, 2.54]);
    translate([exit_x, 0, cable_z]) rotate([90, 0, 0]) cylinder(d = cable_d - 0.3, h = out_w/2 + 0 + 6);
}

if (part == "shell") shell();
else if (part == "cover") cover();
else if (part == "assembly") {
    shell();
    color("tan") module_standin();
    if (potted) color("lightsteelblue") translate([0, 0, 8]) cover();   // lifted 8 to show both
    if (!potted) color("lightblue", 0.5) translate([0, 0, shell_h + 8]) linear_extrude(lid_t) lid_2d();
}
